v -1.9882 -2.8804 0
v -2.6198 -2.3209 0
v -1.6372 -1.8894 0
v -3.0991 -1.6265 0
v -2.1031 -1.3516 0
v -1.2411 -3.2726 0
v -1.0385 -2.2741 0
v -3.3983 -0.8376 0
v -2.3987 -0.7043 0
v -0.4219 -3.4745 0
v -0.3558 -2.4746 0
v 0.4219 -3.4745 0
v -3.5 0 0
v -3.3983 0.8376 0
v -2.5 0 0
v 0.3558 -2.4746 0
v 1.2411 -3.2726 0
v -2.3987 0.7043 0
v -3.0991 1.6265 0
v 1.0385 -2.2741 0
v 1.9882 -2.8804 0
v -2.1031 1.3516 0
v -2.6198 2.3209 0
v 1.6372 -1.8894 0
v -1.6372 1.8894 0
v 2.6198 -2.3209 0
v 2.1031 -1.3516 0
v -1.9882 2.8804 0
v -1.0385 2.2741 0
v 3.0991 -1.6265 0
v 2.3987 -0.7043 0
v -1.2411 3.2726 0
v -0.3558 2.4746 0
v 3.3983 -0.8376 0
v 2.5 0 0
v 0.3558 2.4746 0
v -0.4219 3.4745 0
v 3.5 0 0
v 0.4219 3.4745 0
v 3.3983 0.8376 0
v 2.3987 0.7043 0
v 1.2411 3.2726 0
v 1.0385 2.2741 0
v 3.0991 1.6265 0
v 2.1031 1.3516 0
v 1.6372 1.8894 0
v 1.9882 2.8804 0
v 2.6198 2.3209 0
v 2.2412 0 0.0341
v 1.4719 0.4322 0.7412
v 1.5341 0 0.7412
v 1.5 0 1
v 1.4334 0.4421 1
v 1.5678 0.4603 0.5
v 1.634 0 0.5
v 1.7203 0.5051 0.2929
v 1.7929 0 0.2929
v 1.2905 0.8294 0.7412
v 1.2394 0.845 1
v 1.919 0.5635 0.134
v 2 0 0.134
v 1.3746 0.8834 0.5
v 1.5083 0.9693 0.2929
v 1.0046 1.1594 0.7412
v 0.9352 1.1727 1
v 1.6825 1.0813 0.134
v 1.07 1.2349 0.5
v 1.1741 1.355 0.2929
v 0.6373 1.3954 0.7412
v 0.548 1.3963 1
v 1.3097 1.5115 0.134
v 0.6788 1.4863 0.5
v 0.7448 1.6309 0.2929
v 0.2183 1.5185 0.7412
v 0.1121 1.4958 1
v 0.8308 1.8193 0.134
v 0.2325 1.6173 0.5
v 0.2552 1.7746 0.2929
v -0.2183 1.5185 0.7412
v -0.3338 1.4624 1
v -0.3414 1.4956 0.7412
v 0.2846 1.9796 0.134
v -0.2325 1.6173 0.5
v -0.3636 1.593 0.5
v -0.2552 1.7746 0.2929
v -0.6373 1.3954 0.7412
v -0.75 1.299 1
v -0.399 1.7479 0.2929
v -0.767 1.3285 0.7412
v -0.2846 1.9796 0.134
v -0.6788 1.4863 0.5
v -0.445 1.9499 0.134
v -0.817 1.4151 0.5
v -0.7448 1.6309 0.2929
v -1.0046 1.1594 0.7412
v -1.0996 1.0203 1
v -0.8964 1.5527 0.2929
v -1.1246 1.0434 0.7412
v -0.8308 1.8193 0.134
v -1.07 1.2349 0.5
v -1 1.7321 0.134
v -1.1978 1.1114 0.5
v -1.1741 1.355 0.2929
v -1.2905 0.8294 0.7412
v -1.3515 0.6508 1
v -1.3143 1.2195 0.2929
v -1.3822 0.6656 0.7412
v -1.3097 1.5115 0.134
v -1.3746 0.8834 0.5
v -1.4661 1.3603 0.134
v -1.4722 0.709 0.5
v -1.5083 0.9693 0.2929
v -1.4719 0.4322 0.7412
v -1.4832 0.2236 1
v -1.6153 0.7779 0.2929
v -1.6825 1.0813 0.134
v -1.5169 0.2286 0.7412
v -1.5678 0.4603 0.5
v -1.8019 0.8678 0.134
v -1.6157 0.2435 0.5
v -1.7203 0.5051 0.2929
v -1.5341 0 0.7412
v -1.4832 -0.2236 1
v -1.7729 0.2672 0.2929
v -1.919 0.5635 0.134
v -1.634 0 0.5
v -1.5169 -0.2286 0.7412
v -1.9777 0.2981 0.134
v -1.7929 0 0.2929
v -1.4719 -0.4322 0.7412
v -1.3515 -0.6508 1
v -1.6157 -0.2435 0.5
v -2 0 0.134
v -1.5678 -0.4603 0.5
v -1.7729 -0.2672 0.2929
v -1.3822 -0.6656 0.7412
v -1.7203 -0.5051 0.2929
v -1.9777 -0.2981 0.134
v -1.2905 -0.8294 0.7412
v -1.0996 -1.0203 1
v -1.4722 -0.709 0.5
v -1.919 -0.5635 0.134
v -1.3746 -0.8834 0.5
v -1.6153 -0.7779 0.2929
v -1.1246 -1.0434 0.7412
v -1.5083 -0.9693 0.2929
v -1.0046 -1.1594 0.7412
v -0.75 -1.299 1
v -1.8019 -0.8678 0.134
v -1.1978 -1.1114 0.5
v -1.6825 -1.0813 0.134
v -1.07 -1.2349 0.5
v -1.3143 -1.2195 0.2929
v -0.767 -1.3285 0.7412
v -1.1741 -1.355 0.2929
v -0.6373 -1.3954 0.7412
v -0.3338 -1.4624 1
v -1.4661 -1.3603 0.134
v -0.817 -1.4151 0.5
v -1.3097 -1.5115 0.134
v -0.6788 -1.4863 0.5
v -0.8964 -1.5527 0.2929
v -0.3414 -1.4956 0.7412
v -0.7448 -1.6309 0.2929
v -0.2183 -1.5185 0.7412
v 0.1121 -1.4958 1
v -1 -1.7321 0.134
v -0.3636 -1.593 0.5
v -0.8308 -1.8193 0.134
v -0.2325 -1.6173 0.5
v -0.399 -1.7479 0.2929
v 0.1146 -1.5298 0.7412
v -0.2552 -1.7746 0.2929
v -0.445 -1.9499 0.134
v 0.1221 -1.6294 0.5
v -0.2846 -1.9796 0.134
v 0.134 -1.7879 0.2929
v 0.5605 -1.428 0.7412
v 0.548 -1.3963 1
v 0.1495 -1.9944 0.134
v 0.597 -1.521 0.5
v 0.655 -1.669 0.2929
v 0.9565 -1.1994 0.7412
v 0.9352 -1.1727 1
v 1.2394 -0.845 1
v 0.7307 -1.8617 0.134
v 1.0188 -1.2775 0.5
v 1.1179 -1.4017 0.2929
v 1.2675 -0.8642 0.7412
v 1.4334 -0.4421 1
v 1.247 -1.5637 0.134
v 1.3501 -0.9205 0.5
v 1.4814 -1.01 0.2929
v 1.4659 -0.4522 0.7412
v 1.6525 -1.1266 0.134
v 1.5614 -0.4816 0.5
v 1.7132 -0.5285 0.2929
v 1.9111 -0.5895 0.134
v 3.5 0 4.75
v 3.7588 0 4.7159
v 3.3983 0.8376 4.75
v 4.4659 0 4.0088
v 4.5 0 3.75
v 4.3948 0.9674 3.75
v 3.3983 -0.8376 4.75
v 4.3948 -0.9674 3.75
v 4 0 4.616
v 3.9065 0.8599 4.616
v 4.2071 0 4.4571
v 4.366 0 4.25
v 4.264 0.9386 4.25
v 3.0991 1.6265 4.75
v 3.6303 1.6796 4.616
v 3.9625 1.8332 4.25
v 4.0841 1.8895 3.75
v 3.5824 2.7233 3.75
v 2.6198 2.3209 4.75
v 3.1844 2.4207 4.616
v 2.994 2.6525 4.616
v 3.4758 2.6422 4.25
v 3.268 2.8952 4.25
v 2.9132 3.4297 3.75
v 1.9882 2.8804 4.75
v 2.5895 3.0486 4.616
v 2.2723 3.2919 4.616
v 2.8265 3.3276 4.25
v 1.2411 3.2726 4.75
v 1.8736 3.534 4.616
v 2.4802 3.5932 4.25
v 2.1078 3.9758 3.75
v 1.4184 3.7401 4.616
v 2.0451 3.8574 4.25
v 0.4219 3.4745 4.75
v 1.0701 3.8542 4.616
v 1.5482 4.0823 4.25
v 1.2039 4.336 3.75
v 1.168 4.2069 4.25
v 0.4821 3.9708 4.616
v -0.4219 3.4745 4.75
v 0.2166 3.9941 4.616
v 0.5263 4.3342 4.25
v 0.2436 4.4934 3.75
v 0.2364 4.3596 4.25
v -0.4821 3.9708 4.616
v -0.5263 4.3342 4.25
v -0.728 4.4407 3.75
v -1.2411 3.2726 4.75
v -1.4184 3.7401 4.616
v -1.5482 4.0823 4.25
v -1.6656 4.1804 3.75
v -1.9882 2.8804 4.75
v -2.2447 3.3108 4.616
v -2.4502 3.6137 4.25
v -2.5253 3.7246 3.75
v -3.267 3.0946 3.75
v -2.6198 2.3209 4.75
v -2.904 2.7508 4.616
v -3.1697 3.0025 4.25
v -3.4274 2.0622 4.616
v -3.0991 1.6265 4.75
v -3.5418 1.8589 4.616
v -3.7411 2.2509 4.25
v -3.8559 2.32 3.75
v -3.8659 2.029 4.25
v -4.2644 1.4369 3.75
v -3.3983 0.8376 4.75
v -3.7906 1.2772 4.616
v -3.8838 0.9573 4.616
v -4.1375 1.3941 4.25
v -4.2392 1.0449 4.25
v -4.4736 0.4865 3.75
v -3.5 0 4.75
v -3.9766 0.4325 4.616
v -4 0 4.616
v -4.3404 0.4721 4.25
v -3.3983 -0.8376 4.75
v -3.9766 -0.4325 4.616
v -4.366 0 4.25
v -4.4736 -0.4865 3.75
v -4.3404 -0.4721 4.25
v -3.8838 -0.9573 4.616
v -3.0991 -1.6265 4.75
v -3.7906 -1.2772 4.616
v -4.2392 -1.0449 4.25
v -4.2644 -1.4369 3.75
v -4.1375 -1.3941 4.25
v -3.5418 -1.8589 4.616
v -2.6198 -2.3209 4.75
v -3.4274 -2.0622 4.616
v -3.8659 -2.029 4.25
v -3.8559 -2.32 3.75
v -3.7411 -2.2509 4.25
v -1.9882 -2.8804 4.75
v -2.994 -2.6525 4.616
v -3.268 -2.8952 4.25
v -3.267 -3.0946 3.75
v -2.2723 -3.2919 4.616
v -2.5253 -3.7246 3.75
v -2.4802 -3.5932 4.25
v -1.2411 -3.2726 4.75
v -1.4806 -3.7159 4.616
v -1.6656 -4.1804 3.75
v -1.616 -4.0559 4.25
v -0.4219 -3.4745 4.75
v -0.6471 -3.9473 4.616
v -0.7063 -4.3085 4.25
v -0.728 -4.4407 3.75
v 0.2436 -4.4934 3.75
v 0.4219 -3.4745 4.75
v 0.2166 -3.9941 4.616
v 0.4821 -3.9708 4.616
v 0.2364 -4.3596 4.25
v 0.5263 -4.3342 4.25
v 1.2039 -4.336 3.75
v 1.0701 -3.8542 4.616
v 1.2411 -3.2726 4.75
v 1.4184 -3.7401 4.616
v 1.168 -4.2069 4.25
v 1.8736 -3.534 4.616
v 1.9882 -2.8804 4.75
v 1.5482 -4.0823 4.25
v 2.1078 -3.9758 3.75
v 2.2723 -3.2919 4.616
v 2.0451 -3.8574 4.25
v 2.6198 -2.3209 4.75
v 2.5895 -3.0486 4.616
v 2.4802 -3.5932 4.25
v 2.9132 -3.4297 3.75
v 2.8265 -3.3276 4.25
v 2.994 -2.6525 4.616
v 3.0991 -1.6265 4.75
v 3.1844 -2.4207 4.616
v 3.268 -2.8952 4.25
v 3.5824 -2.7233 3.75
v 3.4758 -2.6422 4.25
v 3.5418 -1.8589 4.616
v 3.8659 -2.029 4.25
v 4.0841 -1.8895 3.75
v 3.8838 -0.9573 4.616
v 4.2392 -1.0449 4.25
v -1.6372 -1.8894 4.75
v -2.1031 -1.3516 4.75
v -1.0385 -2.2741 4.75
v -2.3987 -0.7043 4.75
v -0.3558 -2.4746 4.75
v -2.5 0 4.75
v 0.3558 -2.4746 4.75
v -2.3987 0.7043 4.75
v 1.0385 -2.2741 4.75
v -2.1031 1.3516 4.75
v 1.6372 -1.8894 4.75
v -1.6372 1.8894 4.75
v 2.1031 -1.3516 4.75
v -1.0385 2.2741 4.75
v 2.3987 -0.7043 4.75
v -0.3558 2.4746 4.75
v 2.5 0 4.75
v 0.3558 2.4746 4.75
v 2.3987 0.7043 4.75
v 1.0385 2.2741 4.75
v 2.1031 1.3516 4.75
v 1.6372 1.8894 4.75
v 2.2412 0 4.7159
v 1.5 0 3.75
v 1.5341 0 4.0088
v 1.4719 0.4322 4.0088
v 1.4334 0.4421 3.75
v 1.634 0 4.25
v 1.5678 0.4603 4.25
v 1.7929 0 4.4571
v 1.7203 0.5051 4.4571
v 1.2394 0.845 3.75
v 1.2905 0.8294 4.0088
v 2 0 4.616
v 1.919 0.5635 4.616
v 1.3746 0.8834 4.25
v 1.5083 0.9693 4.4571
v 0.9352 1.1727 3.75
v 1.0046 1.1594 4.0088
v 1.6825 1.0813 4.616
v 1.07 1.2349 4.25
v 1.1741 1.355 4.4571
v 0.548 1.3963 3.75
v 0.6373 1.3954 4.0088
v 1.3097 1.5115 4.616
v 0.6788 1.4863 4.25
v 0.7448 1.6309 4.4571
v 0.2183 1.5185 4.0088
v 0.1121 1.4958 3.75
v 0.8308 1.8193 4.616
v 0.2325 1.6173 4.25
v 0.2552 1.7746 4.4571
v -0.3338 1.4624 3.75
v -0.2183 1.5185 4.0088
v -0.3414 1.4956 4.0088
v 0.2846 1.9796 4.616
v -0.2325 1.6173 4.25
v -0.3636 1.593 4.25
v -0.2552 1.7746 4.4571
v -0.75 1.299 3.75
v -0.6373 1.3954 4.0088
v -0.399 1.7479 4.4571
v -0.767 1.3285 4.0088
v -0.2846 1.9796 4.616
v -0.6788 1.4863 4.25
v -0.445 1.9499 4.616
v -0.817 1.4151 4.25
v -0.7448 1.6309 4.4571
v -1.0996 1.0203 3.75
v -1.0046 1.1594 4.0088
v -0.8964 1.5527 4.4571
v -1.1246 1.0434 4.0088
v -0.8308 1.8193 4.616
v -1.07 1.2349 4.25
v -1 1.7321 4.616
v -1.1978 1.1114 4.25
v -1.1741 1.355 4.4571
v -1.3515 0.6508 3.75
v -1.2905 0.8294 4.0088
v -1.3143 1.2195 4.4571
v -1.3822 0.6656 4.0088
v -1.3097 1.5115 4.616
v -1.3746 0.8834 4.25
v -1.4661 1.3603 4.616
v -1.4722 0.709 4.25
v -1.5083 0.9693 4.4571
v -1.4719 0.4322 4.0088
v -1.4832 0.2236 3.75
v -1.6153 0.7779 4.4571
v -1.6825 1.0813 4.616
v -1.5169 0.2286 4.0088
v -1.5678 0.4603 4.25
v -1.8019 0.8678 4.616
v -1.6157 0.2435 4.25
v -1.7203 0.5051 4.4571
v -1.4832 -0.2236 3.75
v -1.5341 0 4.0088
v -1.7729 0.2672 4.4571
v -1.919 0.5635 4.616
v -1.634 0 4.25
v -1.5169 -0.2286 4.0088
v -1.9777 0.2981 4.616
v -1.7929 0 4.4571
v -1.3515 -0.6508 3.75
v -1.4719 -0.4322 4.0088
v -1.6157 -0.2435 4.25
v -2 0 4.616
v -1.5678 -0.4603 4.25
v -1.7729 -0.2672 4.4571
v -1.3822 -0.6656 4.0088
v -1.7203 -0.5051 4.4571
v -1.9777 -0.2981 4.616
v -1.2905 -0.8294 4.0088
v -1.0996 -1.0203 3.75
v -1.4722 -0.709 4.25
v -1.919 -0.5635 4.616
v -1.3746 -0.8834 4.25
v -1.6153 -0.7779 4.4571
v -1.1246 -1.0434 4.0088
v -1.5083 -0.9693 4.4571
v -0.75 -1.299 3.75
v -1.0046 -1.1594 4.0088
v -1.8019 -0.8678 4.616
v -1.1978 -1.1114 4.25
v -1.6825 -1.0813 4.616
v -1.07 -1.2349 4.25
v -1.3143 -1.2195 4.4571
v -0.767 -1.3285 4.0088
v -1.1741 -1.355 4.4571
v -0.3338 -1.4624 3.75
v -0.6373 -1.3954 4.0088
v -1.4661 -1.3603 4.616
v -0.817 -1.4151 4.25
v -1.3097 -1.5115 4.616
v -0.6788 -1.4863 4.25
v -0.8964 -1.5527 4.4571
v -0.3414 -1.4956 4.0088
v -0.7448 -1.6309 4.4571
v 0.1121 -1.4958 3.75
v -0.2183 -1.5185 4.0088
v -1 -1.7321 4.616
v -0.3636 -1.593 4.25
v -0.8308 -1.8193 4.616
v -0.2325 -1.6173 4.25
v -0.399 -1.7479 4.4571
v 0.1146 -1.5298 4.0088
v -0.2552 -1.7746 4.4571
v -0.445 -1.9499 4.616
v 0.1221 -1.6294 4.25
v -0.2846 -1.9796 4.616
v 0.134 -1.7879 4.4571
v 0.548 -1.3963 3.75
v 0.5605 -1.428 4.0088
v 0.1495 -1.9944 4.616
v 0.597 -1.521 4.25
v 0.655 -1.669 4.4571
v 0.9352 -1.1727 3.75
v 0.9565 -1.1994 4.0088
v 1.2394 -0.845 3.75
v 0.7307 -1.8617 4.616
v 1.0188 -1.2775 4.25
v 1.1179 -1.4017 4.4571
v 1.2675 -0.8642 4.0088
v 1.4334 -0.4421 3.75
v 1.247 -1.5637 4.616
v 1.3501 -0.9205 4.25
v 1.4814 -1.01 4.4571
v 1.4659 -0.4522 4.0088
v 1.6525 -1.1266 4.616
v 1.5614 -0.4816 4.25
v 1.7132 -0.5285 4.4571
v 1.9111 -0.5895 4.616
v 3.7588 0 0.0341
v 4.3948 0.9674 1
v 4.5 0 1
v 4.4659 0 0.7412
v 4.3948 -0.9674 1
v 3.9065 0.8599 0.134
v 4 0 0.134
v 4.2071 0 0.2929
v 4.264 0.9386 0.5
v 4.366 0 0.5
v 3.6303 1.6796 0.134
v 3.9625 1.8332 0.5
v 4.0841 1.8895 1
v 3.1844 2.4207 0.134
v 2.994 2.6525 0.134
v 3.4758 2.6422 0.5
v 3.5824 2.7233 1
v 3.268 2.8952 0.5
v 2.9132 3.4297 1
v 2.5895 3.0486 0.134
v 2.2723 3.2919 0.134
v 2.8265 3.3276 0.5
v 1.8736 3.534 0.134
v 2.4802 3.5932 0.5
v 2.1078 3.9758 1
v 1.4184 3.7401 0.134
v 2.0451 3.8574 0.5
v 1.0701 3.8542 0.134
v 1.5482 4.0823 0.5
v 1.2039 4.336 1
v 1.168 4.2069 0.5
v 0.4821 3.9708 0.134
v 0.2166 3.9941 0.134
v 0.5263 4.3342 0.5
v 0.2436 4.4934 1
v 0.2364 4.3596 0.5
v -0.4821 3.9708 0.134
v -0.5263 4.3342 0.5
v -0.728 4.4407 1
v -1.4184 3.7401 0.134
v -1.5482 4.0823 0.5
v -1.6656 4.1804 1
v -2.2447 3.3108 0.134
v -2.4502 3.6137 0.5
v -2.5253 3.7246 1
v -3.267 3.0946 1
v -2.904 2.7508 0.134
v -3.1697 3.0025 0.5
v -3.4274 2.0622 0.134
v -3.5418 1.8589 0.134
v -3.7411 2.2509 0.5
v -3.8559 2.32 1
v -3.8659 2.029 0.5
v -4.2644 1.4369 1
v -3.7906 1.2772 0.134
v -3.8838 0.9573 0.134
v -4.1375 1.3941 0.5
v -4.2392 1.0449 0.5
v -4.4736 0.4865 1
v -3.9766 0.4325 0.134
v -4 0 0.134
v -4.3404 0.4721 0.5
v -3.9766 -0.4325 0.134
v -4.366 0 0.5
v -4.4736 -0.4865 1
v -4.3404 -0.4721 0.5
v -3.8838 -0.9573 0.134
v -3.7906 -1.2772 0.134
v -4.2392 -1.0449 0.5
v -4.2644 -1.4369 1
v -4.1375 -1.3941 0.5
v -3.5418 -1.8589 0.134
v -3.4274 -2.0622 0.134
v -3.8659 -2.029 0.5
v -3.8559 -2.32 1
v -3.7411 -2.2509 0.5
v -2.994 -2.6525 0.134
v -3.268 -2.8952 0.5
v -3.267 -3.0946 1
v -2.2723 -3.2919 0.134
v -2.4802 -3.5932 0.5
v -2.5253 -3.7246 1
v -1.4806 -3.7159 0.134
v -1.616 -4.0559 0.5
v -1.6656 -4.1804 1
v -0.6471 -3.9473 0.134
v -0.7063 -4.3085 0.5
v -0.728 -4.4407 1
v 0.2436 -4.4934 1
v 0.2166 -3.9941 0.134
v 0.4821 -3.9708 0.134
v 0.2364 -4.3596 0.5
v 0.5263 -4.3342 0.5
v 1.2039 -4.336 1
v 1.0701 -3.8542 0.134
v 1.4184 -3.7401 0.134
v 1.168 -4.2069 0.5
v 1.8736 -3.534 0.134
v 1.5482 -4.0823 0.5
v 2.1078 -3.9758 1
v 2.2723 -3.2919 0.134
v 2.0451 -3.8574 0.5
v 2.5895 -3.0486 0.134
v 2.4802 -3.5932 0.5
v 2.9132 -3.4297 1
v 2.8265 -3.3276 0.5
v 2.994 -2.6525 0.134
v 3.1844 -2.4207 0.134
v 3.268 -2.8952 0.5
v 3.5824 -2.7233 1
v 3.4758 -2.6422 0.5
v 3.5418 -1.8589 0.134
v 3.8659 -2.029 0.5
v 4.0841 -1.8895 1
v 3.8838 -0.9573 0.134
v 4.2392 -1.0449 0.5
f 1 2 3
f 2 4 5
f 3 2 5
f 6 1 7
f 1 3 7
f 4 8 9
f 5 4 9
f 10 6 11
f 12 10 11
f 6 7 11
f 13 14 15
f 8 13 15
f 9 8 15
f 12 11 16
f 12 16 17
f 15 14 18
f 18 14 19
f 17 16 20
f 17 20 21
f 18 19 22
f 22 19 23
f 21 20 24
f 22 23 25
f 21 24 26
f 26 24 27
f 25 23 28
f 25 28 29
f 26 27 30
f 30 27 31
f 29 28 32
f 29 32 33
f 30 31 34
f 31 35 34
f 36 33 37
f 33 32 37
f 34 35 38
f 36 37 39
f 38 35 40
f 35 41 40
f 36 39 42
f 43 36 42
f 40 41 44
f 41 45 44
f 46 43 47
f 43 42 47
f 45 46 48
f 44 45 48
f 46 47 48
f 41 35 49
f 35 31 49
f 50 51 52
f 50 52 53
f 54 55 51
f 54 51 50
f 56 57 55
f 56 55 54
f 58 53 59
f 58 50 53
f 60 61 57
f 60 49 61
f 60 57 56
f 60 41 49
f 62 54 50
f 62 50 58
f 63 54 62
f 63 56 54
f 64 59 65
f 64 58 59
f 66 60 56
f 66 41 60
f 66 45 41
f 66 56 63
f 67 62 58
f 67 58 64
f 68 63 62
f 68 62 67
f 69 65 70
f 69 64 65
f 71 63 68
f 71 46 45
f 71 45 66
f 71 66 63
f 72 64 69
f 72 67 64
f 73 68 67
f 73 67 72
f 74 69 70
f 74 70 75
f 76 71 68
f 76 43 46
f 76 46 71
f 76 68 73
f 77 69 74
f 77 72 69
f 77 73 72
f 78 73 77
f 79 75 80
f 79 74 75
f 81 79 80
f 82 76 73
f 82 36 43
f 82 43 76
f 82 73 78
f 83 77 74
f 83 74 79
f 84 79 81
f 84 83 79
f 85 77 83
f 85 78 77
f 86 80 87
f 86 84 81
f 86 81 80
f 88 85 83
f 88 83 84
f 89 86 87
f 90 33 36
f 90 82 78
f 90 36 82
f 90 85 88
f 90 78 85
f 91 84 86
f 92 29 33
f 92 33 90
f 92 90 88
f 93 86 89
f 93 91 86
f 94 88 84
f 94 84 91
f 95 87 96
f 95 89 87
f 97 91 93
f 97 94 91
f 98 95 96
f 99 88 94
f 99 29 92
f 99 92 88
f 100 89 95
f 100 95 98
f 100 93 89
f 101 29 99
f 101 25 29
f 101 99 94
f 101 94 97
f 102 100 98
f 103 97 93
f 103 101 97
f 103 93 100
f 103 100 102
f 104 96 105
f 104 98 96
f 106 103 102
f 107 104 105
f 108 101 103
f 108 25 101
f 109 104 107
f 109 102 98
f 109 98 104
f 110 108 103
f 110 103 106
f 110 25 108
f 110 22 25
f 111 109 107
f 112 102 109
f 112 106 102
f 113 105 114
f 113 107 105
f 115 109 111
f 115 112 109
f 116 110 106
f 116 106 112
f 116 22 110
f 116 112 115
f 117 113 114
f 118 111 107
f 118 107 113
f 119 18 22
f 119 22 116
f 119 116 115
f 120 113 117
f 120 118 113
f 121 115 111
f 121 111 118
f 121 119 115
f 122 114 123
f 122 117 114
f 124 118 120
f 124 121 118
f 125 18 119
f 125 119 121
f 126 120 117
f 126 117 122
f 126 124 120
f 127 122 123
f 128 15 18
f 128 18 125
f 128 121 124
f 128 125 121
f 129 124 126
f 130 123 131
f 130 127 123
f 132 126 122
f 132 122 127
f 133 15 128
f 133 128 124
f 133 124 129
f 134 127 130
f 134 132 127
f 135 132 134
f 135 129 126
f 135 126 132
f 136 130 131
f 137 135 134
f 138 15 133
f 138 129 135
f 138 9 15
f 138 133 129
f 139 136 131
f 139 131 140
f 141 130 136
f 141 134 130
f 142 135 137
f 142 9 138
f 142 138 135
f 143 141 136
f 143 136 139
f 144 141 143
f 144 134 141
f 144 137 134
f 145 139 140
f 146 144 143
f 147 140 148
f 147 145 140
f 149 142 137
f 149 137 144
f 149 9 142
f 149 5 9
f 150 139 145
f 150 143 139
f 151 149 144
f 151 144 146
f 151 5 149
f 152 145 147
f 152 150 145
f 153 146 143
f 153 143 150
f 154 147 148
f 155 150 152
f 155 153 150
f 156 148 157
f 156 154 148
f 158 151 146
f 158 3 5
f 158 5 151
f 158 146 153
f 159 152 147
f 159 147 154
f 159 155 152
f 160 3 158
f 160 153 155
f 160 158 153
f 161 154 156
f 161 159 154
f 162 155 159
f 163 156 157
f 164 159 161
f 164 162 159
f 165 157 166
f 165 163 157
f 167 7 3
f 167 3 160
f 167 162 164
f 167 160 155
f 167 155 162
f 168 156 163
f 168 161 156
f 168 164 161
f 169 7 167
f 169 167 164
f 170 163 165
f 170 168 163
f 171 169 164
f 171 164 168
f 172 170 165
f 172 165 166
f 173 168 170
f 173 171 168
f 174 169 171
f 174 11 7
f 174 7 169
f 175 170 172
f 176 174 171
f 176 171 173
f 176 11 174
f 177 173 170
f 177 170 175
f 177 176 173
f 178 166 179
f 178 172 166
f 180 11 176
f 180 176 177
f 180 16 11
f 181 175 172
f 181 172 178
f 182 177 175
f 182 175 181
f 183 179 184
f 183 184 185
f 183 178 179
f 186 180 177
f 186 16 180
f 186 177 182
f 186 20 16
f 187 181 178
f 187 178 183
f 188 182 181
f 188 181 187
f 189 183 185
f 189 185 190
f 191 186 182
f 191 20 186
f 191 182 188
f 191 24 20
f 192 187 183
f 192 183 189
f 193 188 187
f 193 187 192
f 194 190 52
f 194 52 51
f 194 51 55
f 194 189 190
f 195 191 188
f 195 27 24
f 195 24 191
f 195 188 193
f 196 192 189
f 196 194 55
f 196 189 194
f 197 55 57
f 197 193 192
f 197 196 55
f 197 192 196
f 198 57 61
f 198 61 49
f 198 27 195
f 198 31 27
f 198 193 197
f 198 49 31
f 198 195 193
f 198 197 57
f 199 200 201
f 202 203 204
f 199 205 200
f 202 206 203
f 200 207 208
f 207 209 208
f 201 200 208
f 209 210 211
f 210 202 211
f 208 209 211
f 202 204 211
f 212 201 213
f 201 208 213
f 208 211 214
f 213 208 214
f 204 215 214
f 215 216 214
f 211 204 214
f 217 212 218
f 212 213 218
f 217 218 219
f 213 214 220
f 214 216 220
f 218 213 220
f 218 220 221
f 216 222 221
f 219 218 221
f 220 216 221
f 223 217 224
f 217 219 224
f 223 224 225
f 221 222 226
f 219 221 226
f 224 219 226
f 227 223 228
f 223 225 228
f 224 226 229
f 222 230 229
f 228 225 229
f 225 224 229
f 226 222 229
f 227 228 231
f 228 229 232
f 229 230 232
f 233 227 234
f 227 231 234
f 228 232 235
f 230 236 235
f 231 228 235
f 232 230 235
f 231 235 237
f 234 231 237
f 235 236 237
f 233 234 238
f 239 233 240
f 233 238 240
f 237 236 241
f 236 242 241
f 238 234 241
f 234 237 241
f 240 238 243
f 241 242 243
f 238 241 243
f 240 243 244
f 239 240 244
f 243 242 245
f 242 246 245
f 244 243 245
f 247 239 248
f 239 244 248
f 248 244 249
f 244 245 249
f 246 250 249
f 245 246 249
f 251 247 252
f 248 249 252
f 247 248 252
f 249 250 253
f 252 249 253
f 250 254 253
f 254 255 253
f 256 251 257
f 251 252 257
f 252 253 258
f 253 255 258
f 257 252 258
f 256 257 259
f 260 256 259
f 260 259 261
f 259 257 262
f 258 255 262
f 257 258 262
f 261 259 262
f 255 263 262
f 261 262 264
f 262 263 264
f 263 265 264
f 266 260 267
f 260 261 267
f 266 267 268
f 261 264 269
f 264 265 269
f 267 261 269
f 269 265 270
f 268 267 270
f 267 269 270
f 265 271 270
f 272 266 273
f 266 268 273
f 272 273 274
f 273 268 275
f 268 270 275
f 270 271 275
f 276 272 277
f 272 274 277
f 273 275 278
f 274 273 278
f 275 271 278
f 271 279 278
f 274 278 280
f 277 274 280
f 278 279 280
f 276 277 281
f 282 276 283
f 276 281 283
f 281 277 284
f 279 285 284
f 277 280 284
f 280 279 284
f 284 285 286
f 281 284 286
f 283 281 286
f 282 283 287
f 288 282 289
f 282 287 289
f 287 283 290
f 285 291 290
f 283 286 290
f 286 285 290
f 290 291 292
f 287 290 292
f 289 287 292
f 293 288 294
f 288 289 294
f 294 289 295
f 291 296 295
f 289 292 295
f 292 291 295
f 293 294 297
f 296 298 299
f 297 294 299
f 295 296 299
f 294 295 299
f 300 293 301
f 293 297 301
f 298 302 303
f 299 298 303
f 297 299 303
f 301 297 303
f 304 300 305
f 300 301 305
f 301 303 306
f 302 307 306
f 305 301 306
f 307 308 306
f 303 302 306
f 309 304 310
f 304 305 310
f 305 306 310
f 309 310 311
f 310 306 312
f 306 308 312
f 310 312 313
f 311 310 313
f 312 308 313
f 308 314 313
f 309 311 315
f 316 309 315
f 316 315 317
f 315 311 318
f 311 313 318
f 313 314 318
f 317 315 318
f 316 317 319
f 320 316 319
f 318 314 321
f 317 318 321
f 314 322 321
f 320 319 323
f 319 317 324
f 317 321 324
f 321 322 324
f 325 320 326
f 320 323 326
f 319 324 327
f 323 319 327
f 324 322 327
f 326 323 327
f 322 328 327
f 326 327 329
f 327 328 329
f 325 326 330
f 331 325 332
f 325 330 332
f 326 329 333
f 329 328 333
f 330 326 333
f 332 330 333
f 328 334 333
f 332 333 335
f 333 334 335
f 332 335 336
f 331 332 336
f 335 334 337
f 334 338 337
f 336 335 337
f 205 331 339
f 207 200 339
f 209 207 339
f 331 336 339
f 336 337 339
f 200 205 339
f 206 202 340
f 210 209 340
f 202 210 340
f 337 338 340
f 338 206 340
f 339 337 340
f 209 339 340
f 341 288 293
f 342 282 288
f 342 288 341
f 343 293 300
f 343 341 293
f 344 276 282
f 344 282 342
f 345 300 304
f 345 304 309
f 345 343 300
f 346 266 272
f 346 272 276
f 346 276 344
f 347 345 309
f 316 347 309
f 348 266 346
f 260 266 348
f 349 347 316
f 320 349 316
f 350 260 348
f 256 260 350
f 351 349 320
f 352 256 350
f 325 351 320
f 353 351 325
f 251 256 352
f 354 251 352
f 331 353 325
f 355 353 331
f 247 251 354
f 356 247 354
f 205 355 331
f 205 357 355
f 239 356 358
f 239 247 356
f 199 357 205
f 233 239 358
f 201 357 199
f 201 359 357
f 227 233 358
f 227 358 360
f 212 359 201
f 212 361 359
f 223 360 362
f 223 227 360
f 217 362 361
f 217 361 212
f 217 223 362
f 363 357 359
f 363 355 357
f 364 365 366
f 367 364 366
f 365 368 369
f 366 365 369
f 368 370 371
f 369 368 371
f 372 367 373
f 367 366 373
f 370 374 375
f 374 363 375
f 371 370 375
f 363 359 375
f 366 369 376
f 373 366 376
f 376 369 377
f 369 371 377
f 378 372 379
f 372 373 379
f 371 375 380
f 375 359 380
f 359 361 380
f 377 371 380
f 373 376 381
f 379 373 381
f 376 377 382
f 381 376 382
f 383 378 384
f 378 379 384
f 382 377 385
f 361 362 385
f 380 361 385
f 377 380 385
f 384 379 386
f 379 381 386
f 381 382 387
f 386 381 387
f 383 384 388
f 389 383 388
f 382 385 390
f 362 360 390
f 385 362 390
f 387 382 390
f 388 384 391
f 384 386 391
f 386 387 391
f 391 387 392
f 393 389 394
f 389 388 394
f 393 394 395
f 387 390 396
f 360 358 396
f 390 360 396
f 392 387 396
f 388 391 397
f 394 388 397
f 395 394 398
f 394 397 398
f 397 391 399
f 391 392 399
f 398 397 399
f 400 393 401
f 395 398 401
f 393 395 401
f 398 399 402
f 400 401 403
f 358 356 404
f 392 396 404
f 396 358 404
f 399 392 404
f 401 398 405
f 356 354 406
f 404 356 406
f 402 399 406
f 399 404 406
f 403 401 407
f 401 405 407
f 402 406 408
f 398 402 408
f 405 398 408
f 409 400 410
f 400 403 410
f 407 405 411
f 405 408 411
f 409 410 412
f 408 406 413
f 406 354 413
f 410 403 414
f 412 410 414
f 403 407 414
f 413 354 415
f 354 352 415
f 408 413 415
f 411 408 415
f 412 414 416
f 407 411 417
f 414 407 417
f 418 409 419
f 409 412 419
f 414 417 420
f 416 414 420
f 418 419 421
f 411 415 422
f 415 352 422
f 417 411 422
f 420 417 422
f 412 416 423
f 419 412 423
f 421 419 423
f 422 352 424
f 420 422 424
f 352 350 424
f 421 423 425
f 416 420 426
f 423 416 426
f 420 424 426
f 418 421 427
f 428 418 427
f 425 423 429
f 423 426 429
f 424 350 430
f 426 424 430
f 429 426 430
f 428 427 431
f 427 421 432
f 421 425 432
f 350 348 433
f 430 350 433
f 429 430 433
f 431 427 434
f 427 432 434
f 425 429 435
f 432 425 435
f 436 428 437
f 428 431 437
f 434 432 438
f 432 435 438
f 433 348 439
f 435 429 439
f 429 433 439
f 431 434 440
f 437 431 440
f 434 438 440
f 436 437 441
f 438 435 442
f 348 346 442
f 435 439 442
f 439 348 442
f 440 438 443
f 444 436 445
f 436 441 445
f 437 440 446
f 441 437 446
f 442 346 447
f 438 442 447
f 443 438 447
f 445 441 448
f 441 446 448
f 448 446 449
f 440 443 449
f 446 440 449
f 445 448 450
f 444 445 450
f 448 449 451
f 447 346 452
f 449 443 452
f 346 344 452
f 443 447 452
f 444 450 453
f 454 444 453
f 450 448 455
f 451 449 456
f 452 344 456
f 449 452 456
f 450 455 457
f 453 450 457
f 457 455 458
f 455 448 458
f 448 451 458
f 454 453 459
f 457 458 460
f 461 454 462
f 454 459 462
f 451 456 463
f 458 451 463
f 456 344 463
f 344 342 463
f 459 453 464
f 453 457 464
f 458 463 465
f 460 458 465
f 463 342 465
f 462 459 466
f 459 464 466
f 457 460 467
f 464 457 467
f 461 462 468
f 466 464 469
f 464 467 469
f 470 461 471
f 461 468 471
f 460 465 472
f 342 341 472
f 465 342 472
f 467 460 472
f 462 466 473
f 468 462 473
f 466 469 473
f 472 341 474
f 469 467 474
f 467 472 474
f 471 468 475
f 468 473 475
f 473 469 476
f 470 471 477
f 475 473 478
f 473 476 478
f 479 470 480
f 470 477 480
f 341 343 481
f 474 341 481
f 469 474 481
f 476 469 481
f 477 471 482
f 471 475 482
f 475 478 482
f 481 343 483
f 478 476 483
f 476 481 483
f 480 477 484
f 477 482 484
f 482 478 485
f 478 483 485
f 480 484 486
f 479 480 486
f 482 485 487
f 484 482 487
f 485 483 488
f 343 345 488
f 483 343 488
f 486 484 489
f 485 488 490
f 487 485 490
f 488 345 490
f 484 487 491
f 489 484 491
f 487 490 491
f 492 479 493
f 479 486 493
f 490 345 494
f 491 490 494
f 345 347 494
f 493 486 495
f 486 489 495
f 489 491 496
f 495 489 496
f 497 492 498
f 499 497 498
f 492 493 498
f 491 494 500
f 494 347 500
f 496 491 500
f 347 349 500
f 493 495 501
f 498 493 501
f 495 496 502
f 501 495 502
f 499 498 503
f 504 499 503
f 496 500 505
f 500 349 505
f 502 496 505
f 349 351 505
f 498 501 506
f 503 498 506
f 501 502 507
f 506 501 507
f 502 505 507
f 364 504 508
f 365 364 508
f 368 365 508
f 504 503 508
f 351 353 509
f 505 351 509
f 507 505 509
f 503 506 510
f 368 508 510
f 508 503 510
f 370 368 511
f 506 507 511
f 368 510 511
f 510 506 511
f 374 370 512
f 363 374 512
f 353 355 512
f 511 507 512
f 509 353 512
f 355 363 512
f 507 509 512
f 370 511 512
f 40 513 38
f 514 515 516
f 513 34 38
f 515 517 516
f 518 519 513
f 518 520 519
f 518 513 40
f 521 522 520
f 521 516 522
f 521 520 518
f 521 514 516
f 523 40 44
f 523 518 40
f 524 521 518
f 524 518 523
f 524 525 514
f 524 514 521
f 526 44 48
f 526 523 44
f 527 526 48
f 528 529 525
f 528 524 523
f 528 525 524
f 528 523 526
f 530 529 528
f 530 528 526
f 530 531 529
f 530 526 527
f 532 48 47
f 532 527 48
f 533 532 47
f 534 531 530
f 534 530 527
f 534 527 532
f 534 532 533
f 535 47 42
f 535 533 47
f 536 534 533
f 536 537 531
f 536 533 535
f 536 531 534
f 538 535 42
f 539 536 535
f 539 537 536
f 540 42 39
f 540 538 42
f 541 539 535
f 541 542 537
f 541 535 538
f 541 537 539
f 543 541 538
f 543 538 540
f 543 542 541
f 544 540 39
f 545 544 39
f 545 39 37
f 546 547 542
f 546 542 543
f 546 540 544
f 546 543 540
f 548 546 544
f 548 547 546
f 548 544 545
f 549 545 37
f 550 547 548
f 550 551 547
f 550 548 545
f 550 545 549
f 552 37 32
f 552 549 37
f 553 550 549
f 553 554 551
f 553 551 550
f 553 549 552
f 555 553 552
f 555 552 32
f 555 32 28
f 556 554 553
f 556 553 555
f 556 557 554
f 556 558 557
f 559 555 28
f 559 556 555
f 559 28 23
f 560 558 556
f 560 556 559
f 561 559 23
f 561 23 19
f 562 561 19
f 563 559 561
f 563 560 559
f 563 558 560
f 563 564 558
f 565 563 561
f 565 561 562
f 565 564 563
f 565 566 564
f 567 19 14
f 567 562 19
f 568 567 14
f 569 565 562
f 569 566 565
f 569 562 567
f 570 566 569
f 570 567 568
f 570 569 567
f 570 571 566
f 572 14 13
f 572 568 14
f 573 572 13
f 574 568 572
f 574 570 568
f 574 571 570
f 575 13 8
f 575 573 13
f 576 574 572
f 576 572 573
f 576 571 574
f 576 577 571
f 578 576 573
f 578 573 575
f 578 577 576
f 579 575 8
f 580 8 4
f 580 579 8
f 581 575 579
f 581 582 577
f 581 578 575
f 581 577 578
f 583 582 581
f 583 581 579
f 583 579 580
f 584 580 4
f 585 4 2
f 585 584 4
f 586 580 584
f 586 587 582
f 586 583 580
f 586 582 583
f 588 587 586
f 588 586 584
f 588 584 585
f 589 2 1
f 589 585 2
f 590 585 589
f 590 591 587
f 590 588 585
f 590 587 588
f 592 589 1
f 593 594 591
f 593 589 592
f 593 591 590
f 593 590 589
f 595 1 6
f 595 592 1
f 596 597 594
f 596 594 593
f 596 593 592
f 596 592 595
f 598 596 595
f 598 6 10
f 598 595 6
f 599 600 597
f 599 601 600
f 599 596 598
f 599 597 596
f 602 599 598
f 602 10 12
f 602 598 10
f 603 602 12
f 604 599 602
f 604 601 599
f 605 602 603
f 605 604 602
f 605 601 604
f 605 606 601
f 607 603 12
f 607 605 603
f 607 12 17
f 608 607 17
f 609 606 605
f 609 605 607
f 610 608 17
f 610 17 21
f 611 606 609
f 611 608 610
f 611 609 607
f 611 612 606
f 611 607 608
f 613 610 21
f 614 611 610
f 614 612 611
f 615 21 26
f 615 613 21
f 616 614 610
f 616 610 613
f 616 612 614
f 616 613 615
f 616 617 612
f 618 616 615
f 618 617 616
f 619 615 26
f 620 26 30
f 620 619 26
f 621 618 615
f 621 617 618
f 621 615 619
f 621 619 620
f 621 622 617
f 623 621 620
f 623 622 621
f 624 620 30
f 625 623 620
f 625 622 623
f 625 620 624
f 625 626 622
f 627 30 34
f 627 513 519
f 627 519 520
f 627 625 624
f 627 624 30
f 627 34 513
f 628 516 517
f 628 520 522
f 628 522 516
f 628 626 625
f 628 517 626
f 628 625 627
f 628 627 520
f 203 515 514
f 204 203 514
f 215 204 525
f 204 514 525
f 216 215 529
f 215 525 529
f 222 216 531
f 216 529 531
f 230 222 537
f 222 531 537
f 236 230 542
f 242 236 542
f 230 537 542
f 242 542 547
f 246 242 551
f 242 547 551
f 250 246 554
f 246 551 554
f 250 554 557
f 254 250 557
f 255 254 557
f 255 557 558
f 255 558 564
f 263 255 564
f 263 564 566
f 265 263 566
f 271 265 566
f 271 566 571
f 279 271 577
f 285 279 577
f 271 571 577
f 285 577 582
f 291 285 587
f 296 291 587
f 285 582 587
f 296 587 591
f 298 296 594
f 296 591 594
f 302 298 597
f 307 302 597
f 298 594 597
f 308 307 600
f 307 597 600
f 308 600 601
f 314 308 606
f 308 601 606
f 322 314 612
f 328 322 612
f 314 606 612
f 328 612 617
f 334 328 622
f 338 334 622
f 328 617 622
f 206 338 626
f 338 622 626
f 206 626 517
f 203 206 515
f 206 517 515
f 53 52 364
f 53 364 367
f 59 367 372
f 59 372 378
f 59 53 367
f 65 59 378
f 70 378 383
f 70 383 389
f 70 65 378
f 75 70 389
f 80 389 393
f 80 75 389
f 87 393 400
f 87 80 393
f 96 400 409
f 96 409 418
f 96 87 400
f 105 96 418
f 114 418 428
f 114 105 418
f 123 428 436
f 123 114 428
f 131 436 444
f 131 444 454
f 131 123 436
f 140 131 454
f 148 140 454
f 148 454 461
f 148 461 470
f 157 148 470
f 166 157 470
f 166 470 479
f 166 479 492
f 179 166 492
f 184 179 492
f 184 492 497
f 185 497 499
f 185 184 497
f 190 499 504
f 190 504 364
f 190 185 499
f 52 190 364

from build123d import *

# Parameters (mm, degrees)
SKETCH1_R           = 9
SKETCH1_R_2         = 3
BOSS_EXTRUDE1_DEPTH = 9.5
FILLET1_R           = 2
FILLET2_R           = 2
SCALE1_SCALE        = 0.5


with BuildPart() as part:
    # Sketch1 → Boss-Extrude1 (new body)
    with BuildSketch(Plane.XY):
        Circle(SKETCH1_R)
        Circle(SKETCH1_R_2, mode=Mode.SUBTRACT)
    extrude(amount=BOSS_EXTRUDE1_DEPTH)

    # Fillet1
    fillet1_edges = [part.edges().sort_by_distance(p)[0] for p in [
        (-3, 0, 0),
        (-3, 0, 9.5),
    ]]
    fillet(fillet1_edges, radius=FILLET1_R)

    # Fillet2
    fillet2_edges = [part.edges().sort_by_distance(p)[0] for p in [
        (-9, 0, 0),
        (-9, 0, 9.5),
    ]]
    fillet(fillet2_edges, radius=FILLET2_R)


with BuildPart() as part_1:
    # Scale1: scaled about (0, 0, 0)
    add(part.part.scale(SCALE1_SCALE))


solid = part_1.part
